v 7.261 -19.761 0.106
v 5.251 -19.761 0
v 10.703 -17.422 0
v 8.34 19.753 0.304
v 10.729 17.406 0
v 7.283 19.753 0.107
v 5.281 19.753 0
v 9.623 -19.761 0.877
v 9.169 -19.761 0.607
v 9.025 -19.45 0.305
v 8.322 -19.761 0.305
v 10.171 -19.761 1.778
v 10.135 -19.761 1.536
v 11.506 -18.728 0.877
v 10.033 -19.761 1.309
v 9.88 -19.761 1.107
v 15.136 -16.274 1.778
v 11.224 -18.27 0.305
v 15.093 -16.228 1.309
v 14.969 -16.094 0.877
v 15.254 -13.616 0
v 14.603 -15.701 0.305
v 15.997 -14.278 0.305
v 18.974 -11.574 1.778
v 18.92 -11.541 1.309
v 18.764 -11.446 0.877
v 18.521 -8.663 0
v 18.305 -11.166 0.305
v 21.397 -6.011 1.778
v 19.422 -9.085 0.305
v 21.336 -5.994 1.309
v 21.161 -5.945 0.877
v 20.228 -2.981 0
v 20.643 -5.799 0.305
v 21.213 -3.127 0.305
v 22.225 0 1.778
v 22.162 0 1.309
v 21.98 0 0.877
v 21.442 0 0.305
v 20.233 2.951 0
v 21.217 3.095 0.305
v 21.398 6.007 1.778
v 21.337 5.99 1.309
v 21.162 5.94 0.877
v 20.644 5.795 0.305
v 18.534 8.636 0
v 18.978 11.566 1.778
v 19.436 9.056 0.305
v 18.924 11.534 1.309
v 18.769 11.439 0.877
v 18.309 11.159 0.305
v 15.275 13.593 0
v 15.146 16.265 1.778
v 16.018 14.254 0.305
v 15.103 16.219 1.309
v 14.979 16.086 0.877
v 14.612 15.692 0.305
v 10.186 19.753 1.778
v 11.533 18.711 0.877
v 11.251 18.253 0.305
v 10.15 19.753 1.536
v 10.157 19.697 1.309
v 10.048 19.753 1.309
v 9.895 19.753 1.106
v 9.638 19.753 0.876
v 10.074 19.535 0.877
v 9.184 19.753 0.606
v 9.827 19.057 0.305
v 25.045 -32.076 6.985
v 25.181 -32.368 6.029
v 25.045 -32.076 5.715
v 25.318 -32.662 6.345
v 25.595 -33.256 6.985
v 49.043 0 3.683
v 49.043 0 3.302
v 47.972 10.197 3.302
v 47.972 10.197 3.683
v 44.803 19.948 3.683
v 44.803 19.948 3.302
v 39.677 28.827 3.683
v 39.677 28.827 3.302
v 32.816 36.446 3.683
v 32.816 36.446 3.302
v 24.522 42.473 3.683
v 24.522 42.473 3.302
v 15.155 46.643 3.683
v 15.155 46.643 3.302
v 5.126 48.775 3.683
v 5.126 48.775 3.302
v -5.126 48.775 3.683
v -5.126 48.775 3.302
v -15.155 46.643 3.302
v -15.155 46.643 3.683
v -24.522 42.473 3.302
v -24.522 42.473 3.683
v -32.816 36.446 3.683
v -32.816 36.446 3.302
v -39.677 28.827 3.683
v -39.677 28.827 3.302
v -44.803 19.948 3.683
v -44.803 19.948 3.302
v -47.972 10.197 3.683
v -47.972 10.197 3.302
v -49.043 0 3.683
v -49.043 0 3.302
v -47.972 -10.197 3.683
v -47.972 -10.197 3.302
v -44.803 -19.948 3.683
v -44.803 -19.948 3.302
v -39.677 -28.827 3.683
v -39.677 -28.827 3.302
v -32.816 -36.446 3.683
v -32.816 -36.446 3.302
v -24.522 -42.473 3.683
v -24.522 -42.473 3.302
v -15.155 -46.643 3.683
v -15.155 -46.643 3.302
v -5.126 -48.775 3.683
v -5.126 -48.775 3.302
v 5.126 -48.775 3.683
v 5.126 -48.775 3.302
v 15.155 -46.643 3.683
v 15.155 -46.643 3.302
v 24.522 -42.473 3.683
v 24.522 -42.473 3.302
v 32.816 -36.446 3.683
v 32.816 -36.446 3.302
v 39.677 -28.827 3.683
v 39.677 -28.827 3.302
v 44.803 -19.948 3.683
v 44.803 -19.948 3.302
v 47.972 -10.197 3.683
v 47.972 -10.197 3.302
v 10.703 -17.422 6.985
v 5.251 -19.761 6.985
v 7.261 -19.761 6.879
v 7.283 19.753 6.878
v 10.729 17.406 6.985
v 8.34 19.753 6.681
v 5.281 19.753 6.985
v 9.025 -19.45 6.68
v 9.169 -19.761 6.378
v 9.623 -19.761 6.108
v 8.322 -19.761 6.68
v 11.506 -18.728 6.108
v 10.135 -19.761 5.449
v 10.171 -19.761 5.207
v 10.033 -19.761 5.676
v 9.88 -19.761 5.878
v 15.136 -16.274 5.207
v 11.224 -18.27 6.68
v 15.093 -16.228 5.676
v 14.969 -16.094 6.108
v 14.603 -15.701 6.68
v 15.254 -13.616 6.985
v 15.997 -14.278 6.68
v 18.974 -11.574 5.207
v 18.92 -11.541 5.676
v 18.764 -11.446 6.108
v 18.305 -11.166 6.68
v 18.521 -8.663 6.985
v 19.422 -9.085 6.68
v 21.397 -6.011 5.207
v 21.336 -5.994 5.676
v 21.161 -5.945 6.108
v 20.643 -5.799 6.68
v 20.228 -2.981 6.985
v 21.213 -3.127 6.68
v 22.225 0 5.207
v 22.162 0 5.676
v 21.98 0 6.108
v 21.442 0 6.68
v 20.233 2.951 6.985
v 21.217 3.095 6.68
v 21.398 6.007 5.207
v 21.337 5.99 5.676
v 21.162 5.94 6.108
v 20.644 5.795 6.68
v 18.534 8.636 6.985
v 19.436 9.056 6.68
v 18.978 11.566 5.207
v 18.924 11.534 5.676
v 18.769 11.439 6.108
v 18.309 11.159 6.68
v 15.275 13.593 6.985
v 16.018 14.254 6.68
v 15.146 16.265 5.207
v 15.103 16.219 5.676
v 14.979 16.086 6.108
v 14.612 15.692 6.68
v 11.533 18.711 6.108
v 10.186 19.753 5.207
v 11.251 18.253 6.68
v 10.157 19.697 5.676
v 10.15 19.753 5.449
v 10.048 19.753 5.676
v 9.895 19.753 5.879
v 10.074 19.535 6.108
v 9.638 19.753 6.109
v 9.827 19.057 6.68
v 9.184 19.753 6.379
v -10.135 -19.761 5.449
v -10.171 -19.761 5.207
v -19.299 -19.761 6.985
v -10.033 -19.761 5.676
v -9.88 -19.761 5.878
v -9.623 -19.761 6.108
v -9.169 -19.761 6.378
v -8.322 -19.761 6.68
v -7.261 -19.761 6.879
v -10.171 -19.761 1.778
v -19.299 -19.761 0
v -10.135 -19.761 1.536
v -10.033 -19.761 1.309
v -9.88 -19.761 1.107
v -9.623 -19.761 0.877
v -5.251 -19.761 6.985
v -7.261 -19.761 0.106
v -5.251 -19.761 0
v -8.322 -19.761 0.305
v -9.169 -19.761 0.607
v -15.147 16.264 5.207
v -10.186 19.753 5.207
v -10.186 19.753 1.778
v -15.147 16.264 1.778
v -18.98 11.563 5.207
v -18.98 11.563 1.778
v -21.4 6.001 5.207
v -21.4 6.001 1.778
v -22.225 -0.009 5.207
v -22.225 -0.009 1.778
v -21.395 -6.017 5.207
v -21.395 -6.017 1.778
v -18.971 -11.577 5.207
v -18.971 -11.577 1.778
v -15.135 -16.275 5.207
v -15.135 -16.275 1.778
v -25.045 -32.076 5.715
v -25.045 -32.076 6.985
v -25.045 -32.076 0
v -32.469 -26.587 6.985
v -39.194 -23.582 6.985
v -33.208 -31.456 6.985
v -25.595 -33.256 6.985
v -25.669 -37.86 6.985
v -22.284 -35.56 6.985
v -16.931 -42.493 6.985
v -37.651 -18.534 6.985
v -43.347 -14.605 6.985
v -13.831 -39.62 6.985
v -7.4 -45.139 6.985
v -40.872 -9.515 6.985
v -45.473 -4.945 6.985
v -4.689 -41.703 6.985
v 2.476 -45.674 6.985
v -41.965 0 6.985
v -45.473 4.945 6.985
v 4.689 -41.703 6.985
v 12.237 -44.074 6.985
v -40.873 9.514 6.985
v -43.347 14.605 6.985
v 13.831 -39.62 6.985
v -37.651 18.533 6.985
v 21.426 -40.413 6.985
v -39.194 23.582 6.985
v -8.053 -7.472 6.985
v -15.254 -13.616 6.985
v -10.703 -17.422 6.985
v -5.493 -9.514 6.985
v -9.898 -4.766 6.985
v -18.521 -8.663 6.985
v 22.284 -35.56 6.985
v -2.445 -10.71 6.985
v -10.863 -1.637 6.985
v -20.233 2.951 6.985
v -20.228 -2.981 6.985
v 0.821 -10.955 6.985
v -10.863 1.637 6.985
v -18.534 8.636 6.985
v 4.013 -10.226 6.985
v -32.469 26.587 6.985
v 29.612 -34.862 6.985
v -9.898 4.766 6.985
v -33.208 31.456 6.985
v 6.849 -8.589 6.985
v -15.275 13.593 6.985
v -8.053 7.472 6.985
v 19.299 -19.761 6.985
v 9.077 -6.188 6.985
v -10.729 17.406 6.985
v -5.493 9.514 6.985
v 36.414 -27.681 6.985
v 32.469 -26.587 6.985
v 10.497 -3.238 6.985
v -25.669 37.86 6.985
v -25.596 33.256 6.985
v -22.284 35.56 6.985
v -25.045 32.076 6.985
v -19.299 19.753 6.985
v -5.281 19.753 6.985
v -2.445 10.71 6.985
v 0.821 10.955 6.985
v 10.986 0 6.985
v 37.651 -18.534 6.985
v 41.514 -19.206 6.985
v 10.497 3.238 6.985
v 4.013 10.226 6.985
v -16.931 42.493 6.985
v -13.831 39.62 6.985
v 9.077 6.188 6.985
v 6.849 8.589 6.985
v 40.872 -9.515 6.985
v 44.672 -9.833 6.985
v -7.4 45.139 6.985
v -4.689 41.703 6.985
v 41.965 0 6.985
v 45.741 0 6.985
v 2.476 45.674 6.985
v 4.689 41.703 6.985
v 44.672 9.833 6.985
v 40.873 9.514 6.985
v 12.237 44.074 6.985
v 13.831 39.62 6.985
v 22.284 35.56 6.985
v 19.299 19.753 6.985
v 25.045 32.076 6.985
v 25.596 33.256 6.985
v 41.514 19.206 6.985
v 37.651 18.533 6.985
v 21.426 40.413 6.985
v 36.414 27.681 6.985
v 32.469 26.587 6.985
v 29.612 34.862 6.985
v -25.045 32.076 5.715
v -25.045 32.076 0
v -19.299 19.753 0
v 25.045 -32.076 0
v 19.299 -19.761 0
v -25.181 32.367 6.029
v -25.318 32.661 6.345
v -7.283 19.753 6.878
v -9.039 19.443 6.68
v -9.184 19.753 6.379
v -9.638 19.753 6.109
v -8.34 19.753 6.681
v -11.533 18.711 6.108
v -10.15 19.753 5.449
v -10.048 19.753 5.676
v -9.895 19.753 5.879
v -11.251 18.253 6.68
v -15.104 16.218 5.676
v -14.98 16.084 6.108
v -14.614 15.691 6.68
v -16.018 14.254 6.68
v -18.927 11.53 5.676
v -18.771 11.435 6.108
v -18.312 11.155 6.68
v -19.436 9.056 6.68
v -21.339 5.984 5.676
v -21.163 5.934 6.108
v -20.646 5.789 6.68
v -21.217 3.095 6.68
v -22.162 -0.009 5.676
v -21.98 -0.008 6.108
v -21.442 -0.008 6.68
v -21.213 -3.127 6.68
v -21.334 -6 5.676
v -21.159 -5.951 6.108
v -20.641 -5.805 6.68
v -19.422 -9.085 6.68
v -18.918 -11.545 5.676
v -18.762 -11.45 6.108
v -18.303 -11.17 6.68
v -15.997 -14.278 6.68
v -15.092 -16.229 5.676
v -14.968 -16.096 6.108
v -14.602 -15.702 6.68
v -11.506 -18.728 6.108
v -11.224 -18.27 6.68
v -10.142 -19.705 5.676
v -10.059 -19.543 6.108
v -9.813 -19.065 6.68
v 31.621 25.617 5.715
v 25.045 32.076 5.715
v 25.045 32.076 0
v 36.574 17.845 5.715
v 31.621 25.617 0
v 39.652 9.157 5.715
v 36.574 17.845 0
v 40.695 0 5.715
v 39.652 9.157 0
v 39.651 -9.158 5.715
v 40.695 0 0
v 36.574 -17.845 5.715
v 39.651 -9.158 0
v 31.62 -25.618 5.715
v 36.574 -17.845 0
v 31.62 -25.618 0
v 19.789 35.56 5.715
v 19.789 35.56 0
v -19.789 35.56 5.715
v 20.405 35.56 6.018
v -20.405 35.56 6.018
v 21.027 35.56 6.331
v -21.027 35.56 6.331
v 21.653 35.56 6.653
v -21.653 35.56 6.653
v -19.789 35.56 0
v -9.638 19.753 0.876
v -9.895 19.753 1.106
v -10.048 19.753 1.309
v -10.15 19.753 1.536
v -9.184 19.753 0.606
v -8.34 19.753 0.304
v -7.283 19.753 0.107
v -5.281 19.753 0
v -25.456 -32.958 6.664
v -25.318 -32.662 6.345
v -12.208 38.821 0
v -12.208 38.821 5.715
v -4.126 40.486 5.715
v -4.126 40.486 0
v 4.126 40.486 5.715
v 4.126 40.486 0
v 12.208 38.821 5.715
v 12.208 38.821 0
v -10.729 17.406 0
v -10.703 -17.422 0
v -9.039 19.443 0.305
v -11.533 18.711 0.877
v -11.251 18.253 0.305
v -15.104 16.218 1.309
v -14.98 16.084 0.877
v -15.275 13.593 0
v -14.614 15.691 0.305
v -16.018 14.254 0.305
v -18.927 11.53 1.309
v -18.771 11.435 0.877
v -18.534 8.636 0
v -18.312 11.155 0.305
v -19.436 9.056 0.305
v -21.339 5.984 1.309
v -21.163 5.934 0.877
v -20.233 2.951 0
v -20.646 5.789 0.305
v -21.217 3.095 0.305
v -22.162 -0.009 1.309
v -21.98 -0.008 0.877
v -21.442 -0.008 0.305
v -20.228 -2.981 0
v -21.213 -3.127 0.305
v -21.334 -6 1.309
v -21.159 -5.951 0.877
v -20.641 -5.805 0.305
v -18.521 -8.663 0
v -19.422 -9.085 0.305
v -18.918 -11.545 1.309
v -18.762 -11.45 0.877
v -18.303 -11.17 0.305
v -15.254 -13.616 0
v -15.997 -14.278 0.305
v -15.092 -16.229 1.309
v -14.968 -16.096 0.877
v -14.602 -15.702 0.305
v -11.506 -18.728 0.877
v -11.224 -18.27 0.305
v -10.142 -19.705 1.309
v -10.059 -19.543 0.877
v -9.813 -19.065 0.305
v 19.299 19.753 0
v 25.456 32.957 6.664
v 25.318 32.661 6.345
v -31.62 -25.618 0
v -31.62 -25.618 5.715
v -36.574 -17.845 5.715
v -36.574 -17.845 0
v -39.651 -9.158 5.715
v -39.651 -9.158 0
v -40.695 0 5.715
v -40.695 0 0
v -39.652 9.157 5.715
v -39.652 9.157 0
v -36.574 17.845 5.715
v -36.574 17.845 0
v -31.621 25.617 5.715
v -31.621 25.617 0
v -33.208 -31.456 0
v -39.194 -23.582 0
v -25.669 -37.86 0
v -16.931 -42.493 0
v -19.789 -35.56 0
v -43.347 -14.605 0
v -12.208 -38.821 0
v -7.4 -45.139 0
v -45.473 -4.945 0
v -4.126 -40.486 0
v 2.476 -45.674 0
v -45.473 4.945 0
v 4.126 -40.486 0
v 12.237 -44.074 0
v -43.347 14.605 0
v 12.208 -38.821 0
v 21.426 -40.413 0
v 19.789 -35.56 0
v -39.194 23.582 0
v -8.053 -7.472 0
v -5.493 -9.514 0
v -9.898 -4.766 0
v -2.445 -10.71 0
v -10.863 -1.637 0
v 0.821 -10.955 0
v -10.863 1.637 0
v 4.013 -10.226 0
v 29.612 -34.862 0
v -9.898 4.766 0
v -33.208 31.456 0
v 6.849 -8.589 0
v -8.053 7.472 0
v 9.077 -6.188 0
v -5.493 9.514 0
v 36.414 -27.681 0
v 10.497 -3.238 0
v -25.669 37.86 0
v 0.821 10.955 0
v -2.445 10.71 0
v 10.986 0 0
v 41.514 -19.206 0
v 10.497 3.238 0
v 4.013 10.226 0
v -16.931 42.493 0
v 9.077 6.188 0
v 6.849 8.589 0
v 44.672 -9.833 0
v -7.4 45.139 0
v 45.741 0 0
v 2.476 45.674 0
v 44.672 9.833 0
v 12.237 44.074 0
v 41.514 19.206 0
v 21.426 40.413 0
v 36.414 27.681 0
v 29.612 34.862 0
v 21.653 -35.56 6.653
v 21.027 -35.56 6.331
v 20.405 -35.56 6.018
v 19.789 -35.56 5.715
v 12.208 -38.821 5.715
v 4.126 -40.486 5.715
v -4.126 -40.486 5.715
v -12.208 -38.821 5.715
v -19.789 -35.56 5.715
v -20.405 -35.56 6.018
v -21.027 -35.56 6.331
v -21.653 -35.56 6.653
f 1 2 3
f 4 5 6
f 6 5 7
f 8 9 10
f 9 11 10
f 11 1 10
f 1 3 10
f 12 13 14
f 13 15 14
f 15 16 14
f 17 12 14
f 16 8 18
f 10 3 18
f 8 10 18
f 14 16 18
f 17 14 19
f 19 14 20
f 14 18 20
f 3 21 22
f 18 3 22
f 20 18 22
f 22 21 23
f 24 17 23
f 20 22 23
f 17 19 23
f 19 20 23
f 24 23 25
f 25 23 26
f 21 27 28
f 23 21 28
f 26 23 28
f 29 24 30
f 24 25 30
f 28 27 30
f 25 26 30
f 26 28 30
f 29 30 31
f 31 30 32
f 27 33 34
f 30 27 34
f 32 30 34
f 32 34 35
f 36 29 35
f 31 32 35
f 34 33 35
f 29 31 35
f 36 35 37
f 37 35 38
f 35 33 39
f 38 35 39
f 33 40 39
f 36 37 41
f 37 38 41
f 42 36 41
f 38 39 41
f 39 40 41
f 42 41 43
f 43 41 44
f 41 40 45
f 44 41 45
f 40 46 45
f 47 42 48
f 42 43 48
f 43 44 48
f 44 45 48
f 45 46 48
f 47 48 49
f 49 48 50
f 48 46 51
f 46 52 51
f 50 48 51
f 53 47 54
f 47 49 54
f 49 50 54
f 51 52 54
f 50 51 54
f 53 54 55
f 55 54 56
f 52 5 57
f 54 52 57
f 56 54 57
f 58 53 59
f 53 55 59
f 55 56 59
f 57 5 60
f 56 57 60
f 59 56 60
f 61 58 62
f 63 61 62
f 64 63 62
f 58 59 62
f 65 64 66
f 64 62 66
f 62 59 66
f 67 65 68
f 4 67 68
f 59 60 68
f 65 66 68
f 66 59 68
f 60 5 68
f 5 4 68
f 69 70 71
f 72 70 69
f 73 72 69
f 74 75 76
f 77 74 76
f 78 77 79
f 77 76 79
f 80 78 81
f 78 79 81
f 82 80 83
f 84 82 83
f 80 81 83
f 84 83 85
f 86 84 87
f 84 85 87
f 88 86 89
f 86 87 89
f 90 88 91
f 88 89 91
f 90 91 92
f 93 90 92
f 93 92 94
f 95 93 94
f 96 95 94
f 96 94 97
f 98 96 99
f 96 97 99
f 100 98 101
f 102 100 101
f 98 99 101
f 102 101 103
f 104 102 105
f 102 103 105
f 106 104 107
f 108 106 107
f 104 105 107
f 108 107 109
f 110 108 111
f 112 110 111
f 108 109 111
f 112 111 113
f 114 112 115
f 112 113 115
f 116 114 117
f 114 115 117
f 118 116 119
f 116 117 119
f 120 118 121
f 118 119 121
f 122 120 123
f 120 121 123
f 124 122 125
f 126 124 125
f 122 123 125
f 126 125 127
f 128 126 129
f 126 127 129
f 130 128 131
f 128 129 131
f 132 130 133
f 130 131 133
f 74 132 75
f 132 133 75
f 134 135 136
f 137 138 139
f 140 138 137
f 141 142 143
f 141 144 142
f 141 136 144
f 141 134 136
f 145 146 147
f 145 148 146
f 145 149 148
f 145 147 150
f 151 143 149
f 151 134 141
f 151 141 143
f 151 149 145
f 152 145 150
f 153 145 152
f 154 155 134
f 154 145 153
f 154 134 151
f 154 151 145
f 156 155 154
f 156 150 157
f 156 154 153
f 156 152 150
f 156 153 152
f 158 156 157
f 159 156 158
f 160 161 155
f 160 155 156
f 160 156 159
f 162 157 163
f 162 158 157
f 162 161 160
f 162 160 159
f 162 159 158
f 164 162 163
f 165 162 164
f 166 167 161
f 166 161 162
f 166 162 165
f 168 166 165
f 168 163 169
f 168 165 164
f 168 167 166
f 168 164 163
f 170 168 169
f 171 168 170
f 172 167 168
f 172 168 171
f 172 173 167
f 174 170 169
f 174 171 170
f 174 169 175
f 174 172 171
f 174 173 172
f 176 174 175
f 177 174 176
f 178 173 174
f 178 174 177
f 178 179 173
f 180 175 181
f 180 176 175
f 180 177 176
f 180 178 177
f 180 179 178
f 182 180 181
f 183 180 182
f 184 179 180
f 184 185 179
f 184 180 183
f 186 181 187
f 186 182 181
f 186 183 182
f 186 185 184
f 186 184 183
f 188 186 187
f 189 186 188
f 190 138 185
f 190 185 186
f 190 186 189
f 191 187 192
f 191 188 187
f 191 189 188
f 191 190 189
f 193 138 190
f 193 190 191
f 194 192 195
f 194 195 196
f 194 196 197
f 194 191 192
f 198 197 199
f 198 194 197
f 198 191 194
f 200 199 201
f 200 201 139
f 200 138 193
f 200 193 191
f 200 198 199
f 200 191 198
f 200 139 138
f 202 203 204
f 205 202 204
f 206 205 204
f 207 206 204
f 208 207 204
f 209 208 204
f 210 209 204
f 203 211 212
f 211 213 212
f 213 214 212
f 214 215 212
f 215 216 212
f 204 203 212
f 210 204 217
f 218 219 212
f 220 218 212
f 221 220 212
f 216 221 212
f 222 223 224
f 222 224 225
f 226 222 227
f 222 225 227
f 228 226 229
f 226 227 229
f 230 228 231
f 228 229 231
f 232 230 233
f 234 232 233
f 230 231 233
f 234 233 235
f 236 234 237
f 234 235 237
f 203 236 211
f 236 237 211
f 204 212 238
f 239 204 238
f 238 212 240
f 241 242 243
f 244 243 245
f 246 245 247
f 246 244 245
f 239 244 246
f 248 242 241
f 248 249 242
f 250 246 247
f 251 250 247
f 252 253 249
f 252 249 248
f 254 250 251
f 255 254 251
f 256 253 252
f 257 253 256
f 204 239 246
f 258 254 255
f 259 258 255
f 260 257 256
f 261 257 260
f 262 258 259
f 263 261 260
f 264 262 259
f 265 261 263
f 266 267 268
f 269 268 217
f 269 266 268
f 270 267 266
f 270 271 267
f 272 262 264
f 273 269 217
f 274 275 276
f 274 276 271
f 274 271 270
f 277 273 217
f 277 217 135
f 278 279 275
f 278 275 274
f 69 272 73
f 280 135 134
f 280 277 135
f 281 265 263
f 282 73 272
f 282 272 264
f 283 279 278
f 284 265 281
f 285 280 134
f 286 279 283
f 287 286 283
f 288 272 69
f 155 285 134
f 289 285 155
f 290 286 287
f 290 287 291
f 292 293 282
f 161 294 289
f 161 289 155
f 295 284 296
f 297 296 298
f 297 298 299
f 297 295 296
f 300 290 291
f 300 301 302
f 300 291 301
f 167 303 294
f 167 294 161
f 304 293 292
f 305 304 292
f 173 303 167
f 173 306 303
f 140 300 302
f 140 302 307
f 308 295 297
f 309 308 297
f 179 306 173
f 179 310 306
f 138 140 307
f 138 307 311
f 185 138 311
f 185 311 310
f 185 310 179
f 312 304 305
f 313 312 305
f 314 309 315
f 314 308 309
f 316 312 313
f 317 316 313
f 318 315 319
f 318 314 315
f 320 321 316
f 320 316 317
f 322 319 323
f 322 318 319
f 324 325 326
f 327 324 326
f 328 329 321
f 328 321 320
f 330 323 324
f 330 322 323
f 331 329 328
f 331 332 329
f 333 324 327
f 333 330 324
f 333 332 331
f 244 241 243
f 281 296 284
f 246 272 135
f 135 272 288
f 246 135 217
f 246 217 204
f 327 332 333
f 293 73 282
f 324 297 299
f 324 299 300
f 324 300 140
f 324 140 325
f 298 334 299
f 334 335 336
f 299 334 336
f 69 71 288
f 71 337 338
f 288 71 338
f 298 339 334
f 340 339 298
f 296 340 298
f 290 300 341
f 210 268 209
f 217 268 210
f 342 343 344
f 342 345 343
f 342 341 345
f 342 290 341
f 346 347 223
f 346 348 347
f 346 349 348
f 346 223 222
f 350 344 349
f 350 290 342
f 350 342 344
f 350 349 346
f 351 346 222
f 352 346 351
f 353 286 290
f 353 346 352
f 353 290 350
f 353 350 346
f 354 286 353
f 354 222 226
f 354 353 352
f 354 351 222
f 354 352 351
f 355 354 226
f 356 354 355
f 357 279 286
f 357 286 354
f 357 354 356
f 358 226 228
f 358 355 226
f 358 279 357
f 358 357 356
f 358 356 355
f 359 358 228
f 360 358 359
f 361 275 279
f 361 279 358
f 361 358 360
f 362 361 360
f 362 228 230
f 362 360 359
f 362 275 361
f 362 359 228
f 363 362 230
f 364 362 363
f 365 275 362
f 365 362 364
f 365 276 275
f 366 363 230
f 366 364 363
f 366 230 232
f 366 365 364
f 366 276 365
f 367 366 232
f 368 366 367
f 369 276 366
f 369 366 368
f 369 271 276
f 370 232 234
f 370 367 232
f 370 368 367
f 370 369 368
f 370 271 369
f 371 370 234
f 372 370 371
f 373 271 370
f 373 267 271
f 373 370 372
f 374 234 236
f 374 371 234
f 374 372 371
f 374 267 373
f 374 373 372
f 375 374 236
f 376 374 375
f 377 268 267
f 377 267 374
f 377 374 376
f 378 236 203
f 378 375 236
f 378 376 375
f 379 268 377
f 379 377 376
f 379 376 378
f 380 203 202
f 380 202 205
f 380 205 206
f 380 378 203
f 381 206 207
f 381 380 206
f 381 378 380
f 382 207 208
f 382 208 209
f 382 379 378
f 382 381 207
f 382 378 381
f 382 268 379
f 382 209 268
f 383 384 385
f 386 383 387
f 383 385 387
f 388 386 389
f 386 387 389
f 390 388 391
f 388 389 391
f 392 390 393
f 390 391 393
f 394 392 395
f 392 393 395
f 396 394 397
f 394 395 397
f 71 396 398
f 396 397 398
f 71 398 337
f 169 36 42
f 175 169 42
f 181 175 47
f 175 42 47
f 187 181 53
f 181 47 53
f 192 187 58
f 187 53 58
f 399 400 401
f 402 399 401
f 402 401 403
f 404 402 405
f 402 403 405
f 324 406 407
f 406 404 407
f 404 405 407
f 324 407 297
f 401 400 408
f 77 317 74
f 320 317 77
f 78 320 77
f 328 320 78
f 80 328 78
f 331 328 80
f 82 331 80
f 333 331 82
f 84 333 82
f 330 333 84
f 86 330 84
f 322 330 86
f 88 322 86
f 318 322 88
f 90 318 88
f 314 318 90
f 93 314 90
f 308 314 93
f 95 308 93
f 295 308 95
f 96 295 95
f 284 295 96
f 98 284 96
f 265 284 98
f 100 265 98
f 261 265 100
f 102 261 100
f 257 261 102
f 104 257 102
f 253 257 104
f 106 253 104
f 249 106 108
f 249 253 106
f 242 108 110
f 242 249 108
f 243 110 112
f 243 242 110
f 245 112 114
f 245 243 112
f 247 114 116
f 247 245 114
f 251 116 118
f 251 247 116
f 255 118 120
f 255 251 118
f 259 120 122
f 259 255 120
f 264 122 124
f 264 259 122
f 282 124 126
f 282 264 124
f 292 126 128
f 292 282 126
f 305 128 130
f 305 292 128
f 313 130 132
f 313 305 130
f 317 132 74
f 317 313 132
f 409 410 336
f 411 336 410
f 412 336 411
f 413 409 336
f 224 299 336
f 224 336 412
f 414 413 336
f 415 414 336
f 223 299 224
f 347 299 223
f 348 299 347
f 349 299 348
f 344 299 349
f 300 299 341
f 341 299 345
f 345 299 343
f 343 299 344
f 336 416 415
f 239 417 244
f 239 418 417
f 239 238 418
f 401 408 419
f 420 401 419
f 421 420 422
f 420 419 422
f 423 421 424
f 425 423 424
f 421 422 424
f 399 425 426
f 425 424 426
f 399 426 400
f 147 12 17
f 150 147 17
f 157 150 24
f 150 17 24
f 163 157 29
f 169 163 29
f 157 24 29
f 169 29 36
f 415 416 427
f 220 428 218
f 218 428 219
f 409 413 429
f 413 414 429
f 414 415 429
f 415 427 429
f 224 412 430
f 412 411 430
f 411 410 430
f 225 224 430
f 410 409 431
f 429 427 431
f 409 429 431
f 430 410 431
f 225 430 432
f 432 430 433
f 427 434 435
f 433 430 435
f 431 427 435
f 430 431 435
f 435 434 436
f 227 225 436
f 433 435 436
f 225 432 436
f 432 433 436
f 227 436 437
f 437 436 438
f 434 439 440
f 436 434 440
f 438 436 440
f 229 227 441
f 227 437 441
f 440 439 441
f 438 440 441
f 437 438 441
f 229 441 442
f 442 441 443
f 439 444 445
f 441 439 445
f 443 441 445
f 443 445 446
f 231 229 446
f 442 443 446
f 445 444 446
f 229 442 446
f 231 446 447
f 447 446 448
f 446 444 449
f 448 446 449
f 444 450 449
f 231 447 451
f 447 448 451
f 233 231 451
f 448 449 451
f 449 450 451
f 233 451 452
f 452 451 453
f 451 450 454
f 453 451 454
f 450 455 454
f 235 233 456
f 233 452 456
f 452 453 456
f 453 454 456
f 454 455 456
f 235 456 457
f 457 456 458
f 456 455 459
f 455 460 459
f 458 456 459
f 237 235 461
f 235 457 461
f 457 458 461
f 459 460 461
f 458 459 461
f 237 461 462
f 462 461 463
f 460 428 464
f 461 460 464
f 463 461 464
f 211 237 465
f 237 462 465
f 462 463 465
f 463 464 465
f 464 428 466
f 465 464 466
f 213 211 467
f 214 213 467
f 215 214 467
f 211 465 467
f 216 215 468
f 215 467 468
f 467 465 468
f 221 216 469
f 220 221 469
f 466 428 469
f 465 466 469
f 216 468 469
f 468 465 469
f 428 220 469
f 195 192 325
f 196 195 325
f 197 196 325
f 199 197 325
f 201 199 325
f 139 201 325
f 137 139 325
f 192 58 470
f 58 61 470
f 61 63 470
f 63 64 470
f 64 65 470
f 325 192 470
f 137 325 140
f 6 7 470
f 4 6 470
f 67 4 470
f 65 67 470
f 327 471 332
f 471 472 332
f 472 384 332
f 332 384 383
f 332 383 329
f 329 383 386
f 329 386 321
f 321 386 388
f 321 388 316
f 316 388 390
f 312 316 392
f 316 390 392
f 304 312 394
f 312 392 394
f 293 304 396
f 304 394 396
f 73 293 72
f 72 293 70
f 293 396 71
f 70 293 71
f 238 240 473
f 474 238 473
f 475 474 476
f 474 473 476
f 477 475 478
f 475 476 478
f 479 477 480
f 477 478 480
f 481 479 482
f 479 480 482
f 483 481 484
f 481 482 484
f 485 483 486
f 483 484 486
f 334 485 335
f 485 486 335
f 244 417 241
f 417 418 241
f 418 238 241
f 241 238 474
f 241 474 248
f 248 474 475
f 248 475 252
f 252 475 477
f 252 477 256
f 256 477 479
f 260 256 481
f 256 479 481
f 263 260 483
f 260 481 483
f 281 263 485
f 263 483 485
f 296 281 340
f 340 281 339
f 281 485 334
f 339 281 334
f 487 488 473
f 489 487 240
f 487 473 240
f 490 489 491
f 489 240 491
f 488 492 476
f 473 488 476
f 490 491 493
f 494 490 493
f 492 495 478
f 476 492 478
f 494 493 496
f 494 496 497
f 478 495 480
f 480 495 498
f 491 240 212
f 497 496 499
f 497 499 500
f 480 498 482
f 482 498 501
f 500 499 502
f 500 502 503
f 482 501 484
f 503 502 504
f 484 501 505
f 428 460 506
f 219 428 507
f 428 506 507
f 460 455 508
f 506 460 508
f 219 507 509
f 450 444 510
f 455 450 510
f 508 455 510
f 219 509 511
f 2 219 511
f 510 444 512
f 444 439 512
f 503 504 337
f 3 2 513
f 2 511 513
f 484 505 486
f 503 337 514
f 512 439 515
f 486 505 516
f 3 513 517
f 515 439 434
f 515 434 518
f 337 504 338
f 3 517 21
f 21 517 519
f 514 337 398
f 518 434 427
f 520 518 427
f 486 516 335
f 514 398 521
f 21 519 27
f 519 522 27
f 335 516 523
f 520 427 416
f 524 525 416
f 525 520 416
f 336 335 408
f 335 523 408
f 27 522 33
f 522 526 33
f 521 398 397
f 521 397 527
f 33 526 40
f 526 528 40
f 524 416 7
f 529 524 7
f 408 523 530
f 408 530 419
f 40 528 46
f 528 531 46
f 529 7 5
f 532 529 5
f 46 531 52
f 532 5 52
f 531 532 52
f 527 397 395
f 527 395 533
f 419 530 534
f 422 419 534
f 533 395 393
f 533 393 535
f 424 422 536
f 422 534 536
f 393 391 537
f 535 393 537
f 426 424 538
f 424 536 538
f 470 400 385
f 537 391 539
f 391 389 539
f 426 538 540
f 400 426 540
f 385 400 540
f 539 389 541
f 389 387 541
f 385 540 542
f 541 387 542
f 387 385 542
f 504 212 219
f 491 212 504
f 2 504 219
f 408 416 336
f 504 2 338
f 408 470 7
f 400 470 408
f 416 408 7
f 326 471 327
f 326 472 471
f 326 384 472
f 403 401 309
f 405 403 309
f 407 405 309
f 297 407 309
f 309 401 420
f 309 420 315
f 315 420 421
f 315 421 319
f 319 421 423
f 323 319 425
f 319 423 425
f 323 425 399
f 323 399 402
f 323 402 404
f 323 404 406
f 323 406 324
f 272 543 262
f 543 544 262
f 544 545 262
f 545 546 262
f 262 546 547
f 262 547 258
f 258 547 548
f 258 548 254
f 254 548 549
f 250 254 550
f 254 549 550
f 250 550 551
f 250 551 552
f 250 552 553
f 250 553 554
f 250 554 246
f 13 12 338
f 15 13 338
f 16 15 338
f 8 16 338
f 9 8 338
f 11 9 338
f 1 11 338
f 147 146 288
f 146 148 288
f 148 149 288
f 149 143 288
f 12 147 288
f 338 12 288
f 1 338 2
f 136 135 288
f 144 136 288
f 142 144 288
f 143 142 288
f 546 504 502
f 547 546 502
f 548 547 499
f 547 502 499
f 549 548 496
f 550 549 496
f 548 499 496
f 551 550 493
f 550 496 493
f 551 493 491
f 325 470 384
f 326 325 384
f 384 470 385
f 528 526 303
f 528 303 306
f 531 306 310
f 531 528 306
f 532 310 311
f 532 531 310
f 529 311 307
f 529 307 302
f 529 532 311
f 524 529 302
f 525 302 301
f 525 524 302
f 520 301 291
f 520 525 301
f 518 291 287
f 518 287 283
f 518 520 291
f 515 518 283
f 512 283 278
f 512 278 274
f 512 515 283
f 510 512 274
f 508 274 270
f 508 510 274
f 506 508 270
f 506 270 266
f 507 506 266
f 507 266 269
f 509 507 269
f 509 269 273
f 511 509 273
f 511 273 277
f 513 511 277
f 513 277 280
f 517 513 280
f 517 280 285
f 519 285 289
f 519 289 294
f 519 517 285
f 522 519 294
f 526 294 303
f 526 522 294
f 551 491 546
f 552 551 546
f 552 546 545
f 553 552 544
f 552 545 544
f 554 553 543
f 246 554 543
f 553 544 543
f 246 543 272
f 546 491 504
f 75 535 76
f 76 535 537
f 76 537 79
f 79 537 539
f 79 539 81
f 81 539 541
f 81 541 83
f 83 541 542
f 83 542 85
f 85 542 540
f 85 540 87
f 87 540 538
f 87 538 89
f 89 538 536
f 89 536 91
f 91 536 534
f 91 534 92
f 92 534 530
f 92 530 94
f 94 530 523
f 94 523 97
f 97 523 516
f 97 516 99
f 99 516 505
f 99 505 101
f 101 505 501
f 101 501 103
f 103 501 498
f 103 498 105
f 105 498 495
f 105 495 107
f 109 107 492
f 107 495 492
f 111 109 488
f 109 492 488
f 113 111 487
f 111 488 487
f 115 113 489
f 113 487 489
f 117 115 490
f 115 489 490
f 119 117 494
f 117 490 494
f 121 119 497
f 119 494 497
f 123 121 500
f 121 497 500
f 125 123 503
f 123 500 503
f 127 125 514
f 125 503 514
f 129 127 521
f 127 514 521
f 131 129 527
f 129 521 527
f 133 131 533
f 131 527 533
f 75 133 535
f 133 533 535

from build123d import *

# Parameters (mm, degrees)
F0_R         = 49.0432335283
F0_R_2       = 10.9855
F1_DEPTH     = 6.985
F2_T4_ANGLE  = 164.4789683114
F2_T10_ANGLE = 164.4789683114
F2_T16_ANGLE = 164.4789683114
F2_T22_ANGLE = 164.4789683114
F3_T4_ANGLE  = 113.2359316918
F3_T10_ANGLE = 67.3888483325
F3_T15_ANGLE = 113.2359316918
F3_T21_ANGLE = 67.3888483325
F4_SIZE      = 3.302


# Not quite as in the source:
# - a fillet or chamfer that OpenCascade refuses, or shapes differently, is made with other operations: its cross-section is extruded or revolved along the edge and cut away or added


with BuildPart() as f1:
    # F0 (on Top) → F1 (new body)
    with BuildSketch(Plane.XY):
        Circle(F0_R)
        with BuildLine():
            Line((26.67, 35.56), (25.0451862182, 32.0755756003))
            ThreePointArc((25.0451862182, 32.0755756003), (36.5740630803, 17.8449380104), (40.6952565147, 0))
            ThreePointArc((40.6952565147, 0), (36.5738989199, -17.8452744611), (25.0445960757, -32.0760363854))
            Line((25.0445960757, -32.0760363854), (26.67, -35.56))
            Line((26.67, -35.56), (19.7886407516, -35.56))
            ThreePointArc((19.7886407516, -35.56), (0, -40.6952565147), (-19.7886407516, -35.56))
            Line((-19.7886407516, -35.56), (-26.67, -35.56))
            Line((-26.67, -35.56), (-25.0445960757, -32.0760363854))
            ThreePointArc((-25.0445960757, -32.0760363854), (-40.695256513, -0.0003743631), (-25.0451862182, 32.0755756003))
            Line((-25.0451862182, 32.0755756003), (-26.67, 35.56))
            Line((-26.67, 35.56), (-19.7886407516, 35.56))
            ThreePointArc((-19.7886407516, 35.56), (0, 40.6952565147), (19.7886407516, 35.56))
            Line((19.7886407516, 35.56), (26.67, 35.56))
        make_face(mode=Mode.SUBTRACT)
        with BuildLine():
            ThreePointArc((-10.1860168797, 19.7533714876), (0, 22.225), (10.1860168797, 19.7533714876))
            Line((10.1860168797, 19.7533714876), (19.299248075, 19.7533714876))
            Line((19.299248075, 19.7533714876), (25.0451862182, 32.0755756003))
            ThreePointArc((25.0451862182, 32.0755756003), (22.4845127485, 33.9197669399), (19.7886407516, 35.56))
            Line((19.7886407516, 35.56), (-19.7886407516, 35.56))
            ThreePointArc((-19.7886407516, 35.56), (-22.4845127485, 33.9197669399), (-25.0451862182, 32.0755756003))
            Line((-25.0451862182, 32.0755756003), (-19.299248075, 19.7533714876))
            Line((-19.299248075, 19.7533714876), (-10.1860168797, 19.7533714876))
        make_face()
        with BuildLine():
            Line((-26.67, 35.56), (-25.0451862182, 32.0755756003))
            ThreePointArc((-25.0451862182, 32.0755756003), (-22.4845127485, 33.9197669399), (-19.7886407516, 35.56))
            Line((-19.7886407516, 35.56), (-26.67, 35.56))
        make_face()
        with BuildLine():
            ThreePointArc((19.7886407516, 35.56), (22.4845127485, 33.9197669399), (25.0451862182, 32.0755756003))
            Line((25.0451862182, 32.0755756003), (26.67, 35.56))
            Line((26.67, 35.56), (19.7886407516, 35.56))
        make_face()
        with BuildLine():
            ThreePointArc((10.1708209875, -19.7612), (18.9736280327, -11.5737662097), (22.225, 0))
            ThreePointArc((22.225, 0), (18.9780774863, 11.5664687751), (10.1860168797, 19.7533714876))
            Line((10.1860168797, 19.7533714876), (0, 19.7533714876))
            Line((0, 19.7533714876), (-10.1860168797, 19.7533714876))
            ThreePointArc((-10.1860168797, 19.7533714876), (-22.2249983566, -0.0085469402), (-10.1708209875, -19.7612))
            Line((-10.1708209875, -19.7612), (0, -19.7612))
            Line((0, -19.7612), (10.1708209875, -19.7612))
        make_face()
        Circle(F0_R_2, mode=Mode.SUBTRACT)
        with BuildLine():
            Line((0, 19.7533714876), (10.1860168797, 19.7533714876))
            ThreePointArc((10.1860168797, 19.7533714876), (0, 22.225), (-10.1860168797, 19.7533714876))
            Line((-10.1860168797, 19.7533714876), (0, 19.7533714876))
        make_face()
        with BuildLine():
            Line((19.299248075, -19.7612), (10.1708209875, -19.7612))
            ThreePointArc((10.1708209875, -19.7612), (0, -22.225), (-10.1708209875, -19.7612))
            Line((-10.1708209875, -19.7612), (-19.299248075, -19.7612))
            Line((-19.299248075, -19.7612), (-25.0445960757, -32.0760363854))
            ThreePointArc((-25.0445960757, -32.0760363854), (-22.4842007134, -33.9199737776), (-19.7886407516, -35.56))
            Line((-19.7886407516, -35.56), (19.7886407516, -35.56))
            ThreePointArc((19.7886407516, -35.56), (22.4842007134, -33.9199737776), (25.0445960757, -32.0760363854))
            Line((25.0445960757, -32.0760363854), (19.299248075, -19.7612))
        make_face()
        with BuildLine():
            ThreePointArc((-10.1708209875, -19.7612), (0, -22.225), (10.1708209875, -19.7612))
            Line((10.1708209875, -19.7612), (0, -19.7612))
            Line((0, -19.7612), (-10.1708209875, -19.7612))
        make_face()
        with BuildLine():
            ThreePointArc((-19.7886407516, -35.56), (-22.4842007134, -33.9199737776), (-25.0445960757, -32.0760363854))
            Line((-25.0445960757, -32.0760363854), (-26.67, -35.56))
            Line((-26.67, -35.56), (-19.7886407516, -35.56))
        make_face()
        with BuildLine():
            Line((26.67, -35.56), (25.0445960757, -32.0760363854))
            ThreePointArc((25.0445960757, -32.0760363854), (22.4842007134, -33.9199737776), (19.7886407516, -35.56))
            Line((19.7886407516, -35.56), (26.67, -35.56))
        make_face()
    extrude(amount=F1_DEPTH)

    # F2: fillet of radius 1.778 on 4 edges, made by hand


with BuildPart() as f2_tool2:
    # F2_s3 → F2_t4 (revolve)
    with BuildSketch(Plane(origin=(0, 0, 0), x_dir=(0, 0, 1), z_dir=(0.9907891286, 0.1354138197, 0))):
        with BuildLine():
            ThreePointArc((5.207, -22.225), (6.4642358569, -21.7042358569), (6.985, -20.447))
            Line((6.985, -20.447), (6.985, -22.225))
            Line((6.985, -22.225), (5.207, -22.225))
        make_face()
    revolve(axis=Axis((0, 0, 6.985), (0, 0, 1)), revolution_arc=F2_T4_ANGLE)

    split(bisect_by=Plane.XZ.offset(-19.7533714876), keep=Keep.TOP)

    split(bisect_by=Plane.XZ.offset(19.7612), keep=Keep.BOTTOM)


with BuildPart() as f1_1:
    add(f1.part)

    # F2_t1: cut F2_tool2
    add(f2_tool2.part, mode=Mode.SUBTRACT)


with BuildPart() as f2_tool8:
    # F2_s9 → F2_t10 (revolve)
    with BuildSketch(Plane(origin=(0, 0, 0), x_dir=(0, 0, 1), z_dir=(-0.9908929862, -0.1346517356, 0))):
        with BuildLine():
            ThreePointArc((5.207, -22.225), (6.4642358569, -21.7042358569), (6.985, -20.447))
            Line((6.985, -20.447), (6.985, -22.225))
            Line((6.985, -22.225), (5.207, -22.225))
        make_face()
    revolve(axis=Axis((0, 0, 6.985), (0, 0, 1)), revolution_arc=F2_T10_ANGLE)

    split(bisect_by=Plane.XZ.offset(19.7612), keep=Keep.BOTTOM)

    split(bisect_by=Plane.XZ.offset(-19.7533714876), keep=Keep.TOP)


with BuildPart() as f1_2:
    add(f1_1.part)

    # F2_t7: cut F2_tool8
    add(f2_tool8.part, mode=Mode.SUBTRACT)


with BuildPart() as f2_tool14:
    # F2_s15 → F2_t16 (revolve)
    with BuildSketch(Plane(origin=(0, 0, 0), x_dir=(0, 0, 1), z_dir=(-0.9908929862, -0.1346517356, 0))):
        with BuildLine():
            ThreePointArc((1.778, -22.225), (0.5207641431, -21.7042358569), (0, -20.447))
            Line((0, -20.447), (0, -22.225))
            Line((0, -22.225), (1.778, -22.225))
        make_face()
    revolve(axis=Axis((0, 0, 0), (0, 0, 1)), revolution_arc=F2_T16_ANGLE)

    split(bisect_by=Plane.XZ.offset(19.7612), keep=Keep.BOTTOM)

    split(bisect_by=Plane.XZ.offset(-19.7533714876), keep=Keep.TOP)


with BuildPart() as f1_3:
    add(f1_2.part)

    # F2_t13: cut F2_tool14
    add(f2_tool14.part, mode=Mode.SUBTRACT)


with BuildPart() as f2_tool20:
    # F2_s21 → F2_t22 (revolve)
    with BuildSketch(Plane(origin=(0, 0, 0), x_dir=(0, 0, 1), z_dir=(0.9907891286, 0.1354138197, 0))):
        with BuildLine():
            ThreePointArc((1.778, -22.225), (0.5207641431, -21.7042358569), (0, -20.447))
            Line((0, -20.447), (0, -22.225))
            Line((0, -22.225), (1.778, -22.225))
        make_face()
    revolve(axis=Axis((0, 0, 0), (0, 0, 1)), revolution_arc=F2_T22_ANGLE)

    split(bisect_by=Plane.XZ.offset(-19.7533714876), keep=Keep.TOP)

    split(bisect_by=Plane.XZ.offset(19.7612), keep=Keep.BOTTOM)


with BuildPart() as f1_4:
    add(f1_3.part)

    # F2_t19: cut F2_tool20
    add(f2_tool20.part, mode=Mode.SUBTRACT)

    # F3: chamfer of 1.27 on 4 edges, made by hand


with BuildPart() as f3_tool2:
    # F3_s3 → F3_t4 (revolve)
    with BuildSketch(Plane(origin=(0, 0, 0), x_dir=(0, 0, 1), z_dir=(0.8350254942, -0.550211254, 0))):
        Polygon((6.985, 41.9652565147), (5.715, 40.6952565147), (6.985, 40.6952565147), align=None)
    revolve(axis=Axis((0, 0, 6.985), (0, 0, -1)), revolution_arc=F3_T4_ANGLE)

    split(bisect_by=Plane(origin=(-8.2863025765, -3.8639663492, 0), x_dir=(0, 0, 1), z_dir=(-0.906307787, -0.4226182617, 0)), keep=Keep.TOP)

    split(bisect_by=Plane(origin=(-8.2780879413, 3.8620485498, 0), x_dir=(0, 0, 1), z_dir=(-0.906227568, 0.4227902494, 0)), keep=Keep.TOP)


with BuildPart() as f1_5:
    add(f1_4.part)

    # F3_t1: cut F3_tool2
    add(f3_tool2.part, mode=Mode.SUBTRACT)


with BuildPart() as f3_tool8:
    # F3_s9 → F3_t10 (revolve)
    with BuildSketch(Plane(origin=(0, 0, 0), x_dir=(0, 0, 1), z_dir=(-0.8320081138, -0.5547634618, 0))):
        Polygon((6.985, 41.9652565147), (5.715, 40.6952565147), (6.985, 40.6952565147), align=None)
    revolve(axis=Axis((0, 0, 6.985), (0, 0, -1)), revolution_arc=F3_T10_ANGLE)

    split(bisect_by=Plane.XZ.offset(-35.56), keep=Keep.BOTTOM)


with BuildPart() as f1_6:
    add(f1_5.part)

    # F3_t7: cut F3_tool8
    add(f3_tool8.part, mode=Mode.SUBTRACT)


with BuildPart() as f3_tool13:
    # F3_s14 → F3_t15 (revolve)
    with BuildSketch(Plane(origin=(0, 0, 0), x_dir=(0, 0, 1), z_dir=(-0.8350153711, 0.550226617, 0))):
        Polygon((6.985, 41.9652565147), (5.715, 40.6952565147), (6.985, 40.6952565147), align=None)
    revolve(axis=Axis((0, 0, 6.985), (0, 0, -1)), revolution_arc=F3_T15_ANGLE)

    split(bisect_by=Plane(origin=(8.2780879413, 3.8620485498, 0), x_dir=(0, 0, 1), z_dir=(0.906227568, 0.4227902494, 0)), keep=Keep.TOP)

    split(bisect_by=Plane(origin=(8.2863025765, -3.8639663492, 0), x_dir=(0, 0, 1), z_dir=(0.906307787, -0.4226182617, 0)), keep=Keep.TOP)


with BuildPart() as f1_7:
    add(f1_6.part)

    # F3_t12: cut F3_tool13
    add(f3_tool13.part, mode=Mode.SUBTRACT)


with BuildPart() as f3_tool19:
    # F3_s20 → F3_t21 (revolve)
    with BuildSketch(Plane(origin=(0, 0, 0), x_dir=(0, 0, 1), z_dir=(0.8320081138, 0.5547634618, 0))):
        Polygon((6.985, 41.9652565147), (5.715, 40.6952565147), (6.985, 40.6952565147), align=None)
    revolve(axis=Axis((0, 0, 6.985), (0, 0, -1)), revolution_arc=F3_T21_ANGLE)

    split(bisect_by=Plane.XZ.offset(35.56), keep=Keep.TOP)


with BuildPart() as f1_8:
    add(f1_7.part)

    # F3_t18: cut F3_tool19
    add(f3_tool19.part, mode=Mode.SUBTRACT)

    # F4
    f4_edges = [f1_8.edges().sort_by_distance(p)[0] for p in [
        (-49.043234, 0, 6.985),
        (-49.043234, 0, 0),
    ]]
    chamfer(f4_edges, length=F4_SIZE)


solid = f1_8.part
